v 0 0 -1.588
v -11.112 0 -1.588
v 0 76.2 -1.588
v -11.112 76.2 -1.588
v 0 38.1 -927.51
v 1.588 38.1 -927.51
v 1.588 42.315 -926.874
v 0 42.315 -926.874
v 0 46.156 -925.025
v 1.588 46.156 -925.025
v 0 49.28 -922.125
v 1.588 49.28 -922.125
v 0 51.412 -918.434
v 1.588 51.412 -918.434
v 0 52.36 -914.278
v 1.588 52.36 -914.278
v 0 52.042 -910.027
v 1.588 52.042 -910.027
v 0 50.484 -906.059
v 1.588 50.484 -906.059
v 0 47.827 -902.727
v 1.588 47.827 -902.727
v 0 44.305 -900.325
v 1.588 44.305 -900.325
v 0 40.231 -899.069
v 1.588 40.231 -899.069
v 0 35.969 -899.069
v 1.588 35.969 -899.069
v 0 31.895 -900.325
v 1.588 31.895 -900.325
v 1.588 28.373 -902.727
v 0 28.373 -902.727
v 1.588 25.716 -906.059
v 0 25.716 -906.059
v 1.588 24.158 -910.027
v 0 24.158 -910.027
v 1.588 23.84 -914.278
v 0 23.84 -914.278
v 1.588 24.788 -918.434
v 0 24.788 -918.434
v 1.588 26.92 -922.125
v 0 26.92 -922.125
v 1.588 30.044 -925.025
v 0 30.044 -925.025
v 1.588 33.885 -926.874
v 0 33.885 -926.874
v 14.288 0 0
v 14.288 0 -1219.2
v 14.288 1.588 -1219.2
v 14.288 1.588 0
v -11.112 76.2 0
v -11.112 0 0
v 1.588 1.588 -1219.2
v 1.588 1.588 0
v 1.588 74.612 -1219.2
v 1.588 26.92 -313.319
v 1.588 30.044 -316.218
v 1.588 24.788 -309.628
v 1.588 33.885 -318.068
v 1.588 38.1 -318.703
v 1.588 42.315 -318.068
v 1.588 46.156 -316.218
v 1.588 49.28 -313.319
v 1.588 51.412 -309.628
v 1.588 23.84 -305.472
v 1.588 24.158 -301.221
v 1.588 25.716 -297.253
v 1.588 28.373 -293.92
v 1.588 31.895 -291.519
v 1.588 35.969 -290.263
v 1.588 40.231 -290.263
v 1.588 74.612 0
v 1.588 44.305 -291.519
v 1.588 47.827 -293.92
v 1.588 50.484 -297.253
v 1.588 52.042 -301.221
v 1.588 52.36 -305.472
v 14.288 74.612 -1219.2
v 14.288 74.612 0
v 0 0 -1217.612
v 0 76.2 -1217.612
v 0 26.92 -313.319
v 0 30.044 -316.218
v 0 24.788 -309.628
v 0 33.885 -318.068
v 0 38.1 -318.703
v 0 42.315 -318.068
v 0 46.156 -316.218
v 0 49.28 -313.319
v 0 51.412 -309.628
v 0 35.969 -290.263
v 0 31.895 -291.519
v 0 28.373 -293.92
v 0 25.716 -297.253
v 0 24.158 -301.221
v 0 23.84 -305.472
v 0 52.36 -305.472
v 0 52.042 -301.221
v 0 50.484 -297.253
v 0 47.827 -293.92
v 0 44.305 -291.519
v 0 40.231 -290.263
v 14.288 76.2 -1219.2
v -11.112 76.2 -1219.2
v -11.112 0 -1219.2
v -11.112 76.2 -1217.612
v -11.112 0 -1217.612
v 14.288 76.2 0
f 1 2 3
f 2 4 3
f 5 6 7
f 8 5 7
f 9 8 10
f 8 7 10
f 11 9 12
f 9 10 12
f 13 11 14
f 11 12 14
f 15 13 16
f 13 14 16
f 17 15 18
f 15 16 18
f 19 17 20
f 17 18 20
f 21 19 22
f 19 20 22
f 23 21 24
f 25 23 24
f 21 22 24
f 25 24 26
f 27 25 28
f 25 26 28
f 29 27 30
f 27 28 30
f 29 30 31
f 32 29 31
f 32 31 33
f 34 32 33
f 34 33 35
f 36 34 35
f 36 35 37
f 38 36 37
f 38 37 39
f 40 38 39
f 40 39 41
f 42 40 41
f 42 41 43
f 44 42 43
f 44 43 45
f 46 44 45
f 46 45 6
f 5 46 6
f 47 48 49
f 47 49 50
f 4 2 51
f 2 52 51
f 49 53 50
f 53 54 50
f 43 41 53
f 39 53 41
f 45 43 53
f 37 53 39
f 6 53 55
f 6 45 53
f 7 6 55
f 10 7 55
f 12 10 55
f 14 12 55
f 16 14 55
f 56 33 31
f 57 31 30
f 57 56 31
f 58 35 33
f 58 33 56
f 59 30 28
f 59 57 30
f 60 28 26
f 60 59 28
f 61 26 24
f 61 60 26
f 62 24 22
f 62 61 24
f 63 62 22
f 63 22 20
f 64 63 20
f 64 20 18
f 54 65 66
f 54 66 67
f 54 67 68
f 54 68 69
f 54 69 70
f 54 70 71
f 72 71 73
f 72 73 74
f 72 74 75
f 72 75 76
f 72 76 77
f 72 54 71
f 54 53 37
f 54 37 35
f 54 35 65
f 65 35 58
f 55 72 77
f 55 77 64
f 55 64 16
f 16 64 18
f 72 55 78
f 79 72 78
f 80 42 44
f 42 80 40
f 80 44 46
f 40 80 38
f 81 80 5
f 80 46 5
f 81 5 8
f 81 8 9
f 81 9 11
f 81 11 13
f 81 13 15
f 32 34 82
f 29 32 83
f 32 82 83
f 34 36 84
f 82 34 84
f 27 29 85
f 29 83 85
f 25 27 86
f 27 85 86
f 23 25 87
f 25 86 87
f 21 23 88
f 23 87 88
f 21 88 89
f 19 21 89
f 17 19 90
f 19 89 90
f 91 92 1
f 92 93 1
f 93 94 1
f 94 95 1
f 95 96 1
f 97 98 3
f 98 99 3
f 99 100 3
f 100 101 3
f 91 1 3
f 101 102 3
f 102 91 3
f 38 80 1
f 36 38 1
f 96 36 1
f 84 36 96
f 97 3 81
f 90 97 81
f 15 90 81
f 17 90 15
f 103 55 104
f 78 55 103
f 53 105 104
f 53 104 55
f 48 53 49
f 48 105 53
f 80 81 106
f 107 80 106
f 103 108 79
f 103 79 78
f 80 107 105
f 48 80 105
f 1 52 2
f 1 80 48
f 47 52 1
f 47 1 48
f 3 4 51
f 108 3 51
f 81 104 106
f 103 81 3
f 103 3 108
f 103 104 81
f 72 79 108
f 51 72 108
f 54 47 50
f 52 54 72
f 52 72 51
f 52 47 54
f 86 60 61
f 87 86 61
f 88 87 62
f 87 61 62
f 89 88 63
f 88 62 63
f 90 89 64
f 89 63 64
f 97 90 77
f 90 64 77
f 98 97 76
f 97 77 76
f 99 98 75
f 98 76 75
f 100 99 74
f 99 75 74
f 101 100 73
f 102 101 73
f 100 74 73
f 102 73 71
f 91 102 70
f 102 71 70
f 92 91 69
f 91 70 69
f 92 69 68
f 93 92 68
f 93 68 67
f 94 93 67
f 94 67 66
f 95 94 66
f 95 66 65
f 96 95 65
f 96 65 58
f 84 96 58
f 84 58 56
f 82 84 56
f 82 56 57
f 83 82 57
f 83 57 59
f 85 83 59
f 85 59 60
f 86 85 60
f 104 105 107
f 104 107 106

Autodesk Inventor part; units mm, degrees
ref_plane "YZ Plane" through (0, 0, 0) normal (1, 0, 0) x (0, 1, 0)
ref_plane "XZ Plane" through (0, 0, 0) normal (0, 1, 0) x (-1, 0, 0)
ref_plane "XY Plane" through (0, 0, 0) normal (0, 0, 1) x (1, 0, 0)
sketch "Sketch1" plane through (0, 0, 0) normal (1, 0, 0) x (0, 1, 0)
  line L0 (0, 0) -> (76.2, 0)
  line L1 (76.2, 0) -> (76.2, -1219.2)
  line L2 (76.2, -1219.2) -> (0, -1219.2)
  line L3 (0, -1219.2) -> (0, 0)
  dimension "d0" = 76.2
  dimension "d1" = 1219.2
extrude "Extrusion1" add sketch "Sketch1" along normal blind 1.5875
sketch "Sketch2" plane through (0, 0, 0) normal (0, 0, 1) x (1, 0, 0)
  line L0 (0, 76.2) -> (0, 0) projected
  line L1 (0, 0) -> (1.5875, 0) projected
  line L2 (1.5875, 76.2) -> (1.5875, 0) projected
  line L3 (0, 76.2) -> (1.5875, 76.2) projected
  line L4 (1.5875, 0) -> (-11.1125, 0)
  line L5 (-11.1125, 0) -> (-11.1125, 76.2)
  line L6 (-11.1125, 76.2) -> (1.5875, 76.2)
  line L7 (1.5875, 76.2) -> (1.5875, 0)
  dimension "d4" = 12.7
extrude "Extrusion2" add sketch "Sketch2" against normal blind 1.5875 contours L0 L4 L5 L6
sketch "Sketch3" plane through (0, 0, -1219.2) normal (0, 0, -1) x (-1, 0, 0)
  line L0 (0, 0) -> (11.1125, 0) projected
  line L1 (11.1125, 0) -> (11.1125, 76.2) projected
  line L2 (11.1125, 76.2) -> (0, 76.2) projected
  line L3 (0, 0) -> (0, 76.2) projected
extrude "Extrusion3" add sketch "Sketch3" against normal blind 1.5875
sketch "Sketch5" plane through (1.5875, 76.2, 0) normal (0, 1, 0) x (1, 0, 0)
  line L0 (-1.5875, 1217.6125) -> (-1.5875, 1.5875) projected
  line L1 (-12.7, 1.5875) -> (-1.5875, 1.5875) projected
  line L2 (-12.7, 0) -> (-12.7, 1.5875) projected
  line L3 (-12.7, 0) -> (0, 0) projected
  line L4 (0, 1219.2) -> (0, 0) projected
  line L5 (-12.7, 1219.2) -> (0, 1219.2) projected
  line L6 (-12.7, 1219.2) -> (-12.7, 1217.6125) projected
  line L7 (-1.5875, 1217.6125) -> (-12.7, 1217.6125) projected
  line L8 (0, 0) -> (12.7, 0)
  line L9 (12.7, 0) -> (12.7, 1219.2)
  line L10 (12.7, 1219.2) -> (0, 1219.2)
  line L11 (0, 1219.2) -> (0, 0)
  point P0 (-1.5875, 0)
  dimension "d13" = 12.7
extrude "Extrusion4" add sketch "Sketch5" against normal blind 1.5875 contours L10 L9 L8 L4
sketch "Sketch6" plane through (1.5875, 0, -1219.2) normal (0, -1, 0) x (1, 0, 0)
  line L0 (12.7, 0) -> (12.7, 1219.2) projected
  line L1 (12.7, 1219.2) -> (0, 1219.2) projected
  line L2 (0, 0) -> (0, 1219.2) projected
  line L3 (0, 0) -> (12.7, 0) projected
  point P0 (-1.5875, 1219.2)
extrude "Extrusion5" add sketch "Sketch6" against normal blind 1.5875
sketch "Sketch7" plane through (1.5875, 0, 0) normal (1, 0, 0) x (0, 0, -1)
  line L0 (0, 1.5875) -> (1219.2, 1.5875) projected
  line L1 (1219.2, 1.5875) -> (1219.2, 74.6125) projected
  line L2 (1219.2, 74.6125) -> (0, 74.6125) projected
  line L3 (0, 74.6125) -> (0, 1.5875) projected
  line L4 (0, 38.1) -> (1217.6125, 38.1)
  line L5 (1217.6125, 76.2) -> (1217.6125, 0) projected
  line L6 (608.8062, 38.1) -> (608.8062, 66.0202)
  line L7 (608.8062, 66.0202) -> (0, 66.0202)
  line L8 (304.4031, 66.0202) -> (304.4031, 38.1)
  circle A0 centre (304.4031, 38.1) radius 14.3002
  circle A1 centre (608.8062, 38.1) radius 14.3002
  circle A2 centre (913.2094, 38.1) radius 14.3002
  point P0 (0, 0)
  dimension "d18" = 28.6004
  dimension "d19" = 28.6004
extrude "Extrusion6" cut sketch "Sketch7" against normal blind 25.4 contours A0 L8 L4 | L4 A0 | A2 L4 | L4 A2 | L8 A0 L4
properties part number "Chassis SideV1"
